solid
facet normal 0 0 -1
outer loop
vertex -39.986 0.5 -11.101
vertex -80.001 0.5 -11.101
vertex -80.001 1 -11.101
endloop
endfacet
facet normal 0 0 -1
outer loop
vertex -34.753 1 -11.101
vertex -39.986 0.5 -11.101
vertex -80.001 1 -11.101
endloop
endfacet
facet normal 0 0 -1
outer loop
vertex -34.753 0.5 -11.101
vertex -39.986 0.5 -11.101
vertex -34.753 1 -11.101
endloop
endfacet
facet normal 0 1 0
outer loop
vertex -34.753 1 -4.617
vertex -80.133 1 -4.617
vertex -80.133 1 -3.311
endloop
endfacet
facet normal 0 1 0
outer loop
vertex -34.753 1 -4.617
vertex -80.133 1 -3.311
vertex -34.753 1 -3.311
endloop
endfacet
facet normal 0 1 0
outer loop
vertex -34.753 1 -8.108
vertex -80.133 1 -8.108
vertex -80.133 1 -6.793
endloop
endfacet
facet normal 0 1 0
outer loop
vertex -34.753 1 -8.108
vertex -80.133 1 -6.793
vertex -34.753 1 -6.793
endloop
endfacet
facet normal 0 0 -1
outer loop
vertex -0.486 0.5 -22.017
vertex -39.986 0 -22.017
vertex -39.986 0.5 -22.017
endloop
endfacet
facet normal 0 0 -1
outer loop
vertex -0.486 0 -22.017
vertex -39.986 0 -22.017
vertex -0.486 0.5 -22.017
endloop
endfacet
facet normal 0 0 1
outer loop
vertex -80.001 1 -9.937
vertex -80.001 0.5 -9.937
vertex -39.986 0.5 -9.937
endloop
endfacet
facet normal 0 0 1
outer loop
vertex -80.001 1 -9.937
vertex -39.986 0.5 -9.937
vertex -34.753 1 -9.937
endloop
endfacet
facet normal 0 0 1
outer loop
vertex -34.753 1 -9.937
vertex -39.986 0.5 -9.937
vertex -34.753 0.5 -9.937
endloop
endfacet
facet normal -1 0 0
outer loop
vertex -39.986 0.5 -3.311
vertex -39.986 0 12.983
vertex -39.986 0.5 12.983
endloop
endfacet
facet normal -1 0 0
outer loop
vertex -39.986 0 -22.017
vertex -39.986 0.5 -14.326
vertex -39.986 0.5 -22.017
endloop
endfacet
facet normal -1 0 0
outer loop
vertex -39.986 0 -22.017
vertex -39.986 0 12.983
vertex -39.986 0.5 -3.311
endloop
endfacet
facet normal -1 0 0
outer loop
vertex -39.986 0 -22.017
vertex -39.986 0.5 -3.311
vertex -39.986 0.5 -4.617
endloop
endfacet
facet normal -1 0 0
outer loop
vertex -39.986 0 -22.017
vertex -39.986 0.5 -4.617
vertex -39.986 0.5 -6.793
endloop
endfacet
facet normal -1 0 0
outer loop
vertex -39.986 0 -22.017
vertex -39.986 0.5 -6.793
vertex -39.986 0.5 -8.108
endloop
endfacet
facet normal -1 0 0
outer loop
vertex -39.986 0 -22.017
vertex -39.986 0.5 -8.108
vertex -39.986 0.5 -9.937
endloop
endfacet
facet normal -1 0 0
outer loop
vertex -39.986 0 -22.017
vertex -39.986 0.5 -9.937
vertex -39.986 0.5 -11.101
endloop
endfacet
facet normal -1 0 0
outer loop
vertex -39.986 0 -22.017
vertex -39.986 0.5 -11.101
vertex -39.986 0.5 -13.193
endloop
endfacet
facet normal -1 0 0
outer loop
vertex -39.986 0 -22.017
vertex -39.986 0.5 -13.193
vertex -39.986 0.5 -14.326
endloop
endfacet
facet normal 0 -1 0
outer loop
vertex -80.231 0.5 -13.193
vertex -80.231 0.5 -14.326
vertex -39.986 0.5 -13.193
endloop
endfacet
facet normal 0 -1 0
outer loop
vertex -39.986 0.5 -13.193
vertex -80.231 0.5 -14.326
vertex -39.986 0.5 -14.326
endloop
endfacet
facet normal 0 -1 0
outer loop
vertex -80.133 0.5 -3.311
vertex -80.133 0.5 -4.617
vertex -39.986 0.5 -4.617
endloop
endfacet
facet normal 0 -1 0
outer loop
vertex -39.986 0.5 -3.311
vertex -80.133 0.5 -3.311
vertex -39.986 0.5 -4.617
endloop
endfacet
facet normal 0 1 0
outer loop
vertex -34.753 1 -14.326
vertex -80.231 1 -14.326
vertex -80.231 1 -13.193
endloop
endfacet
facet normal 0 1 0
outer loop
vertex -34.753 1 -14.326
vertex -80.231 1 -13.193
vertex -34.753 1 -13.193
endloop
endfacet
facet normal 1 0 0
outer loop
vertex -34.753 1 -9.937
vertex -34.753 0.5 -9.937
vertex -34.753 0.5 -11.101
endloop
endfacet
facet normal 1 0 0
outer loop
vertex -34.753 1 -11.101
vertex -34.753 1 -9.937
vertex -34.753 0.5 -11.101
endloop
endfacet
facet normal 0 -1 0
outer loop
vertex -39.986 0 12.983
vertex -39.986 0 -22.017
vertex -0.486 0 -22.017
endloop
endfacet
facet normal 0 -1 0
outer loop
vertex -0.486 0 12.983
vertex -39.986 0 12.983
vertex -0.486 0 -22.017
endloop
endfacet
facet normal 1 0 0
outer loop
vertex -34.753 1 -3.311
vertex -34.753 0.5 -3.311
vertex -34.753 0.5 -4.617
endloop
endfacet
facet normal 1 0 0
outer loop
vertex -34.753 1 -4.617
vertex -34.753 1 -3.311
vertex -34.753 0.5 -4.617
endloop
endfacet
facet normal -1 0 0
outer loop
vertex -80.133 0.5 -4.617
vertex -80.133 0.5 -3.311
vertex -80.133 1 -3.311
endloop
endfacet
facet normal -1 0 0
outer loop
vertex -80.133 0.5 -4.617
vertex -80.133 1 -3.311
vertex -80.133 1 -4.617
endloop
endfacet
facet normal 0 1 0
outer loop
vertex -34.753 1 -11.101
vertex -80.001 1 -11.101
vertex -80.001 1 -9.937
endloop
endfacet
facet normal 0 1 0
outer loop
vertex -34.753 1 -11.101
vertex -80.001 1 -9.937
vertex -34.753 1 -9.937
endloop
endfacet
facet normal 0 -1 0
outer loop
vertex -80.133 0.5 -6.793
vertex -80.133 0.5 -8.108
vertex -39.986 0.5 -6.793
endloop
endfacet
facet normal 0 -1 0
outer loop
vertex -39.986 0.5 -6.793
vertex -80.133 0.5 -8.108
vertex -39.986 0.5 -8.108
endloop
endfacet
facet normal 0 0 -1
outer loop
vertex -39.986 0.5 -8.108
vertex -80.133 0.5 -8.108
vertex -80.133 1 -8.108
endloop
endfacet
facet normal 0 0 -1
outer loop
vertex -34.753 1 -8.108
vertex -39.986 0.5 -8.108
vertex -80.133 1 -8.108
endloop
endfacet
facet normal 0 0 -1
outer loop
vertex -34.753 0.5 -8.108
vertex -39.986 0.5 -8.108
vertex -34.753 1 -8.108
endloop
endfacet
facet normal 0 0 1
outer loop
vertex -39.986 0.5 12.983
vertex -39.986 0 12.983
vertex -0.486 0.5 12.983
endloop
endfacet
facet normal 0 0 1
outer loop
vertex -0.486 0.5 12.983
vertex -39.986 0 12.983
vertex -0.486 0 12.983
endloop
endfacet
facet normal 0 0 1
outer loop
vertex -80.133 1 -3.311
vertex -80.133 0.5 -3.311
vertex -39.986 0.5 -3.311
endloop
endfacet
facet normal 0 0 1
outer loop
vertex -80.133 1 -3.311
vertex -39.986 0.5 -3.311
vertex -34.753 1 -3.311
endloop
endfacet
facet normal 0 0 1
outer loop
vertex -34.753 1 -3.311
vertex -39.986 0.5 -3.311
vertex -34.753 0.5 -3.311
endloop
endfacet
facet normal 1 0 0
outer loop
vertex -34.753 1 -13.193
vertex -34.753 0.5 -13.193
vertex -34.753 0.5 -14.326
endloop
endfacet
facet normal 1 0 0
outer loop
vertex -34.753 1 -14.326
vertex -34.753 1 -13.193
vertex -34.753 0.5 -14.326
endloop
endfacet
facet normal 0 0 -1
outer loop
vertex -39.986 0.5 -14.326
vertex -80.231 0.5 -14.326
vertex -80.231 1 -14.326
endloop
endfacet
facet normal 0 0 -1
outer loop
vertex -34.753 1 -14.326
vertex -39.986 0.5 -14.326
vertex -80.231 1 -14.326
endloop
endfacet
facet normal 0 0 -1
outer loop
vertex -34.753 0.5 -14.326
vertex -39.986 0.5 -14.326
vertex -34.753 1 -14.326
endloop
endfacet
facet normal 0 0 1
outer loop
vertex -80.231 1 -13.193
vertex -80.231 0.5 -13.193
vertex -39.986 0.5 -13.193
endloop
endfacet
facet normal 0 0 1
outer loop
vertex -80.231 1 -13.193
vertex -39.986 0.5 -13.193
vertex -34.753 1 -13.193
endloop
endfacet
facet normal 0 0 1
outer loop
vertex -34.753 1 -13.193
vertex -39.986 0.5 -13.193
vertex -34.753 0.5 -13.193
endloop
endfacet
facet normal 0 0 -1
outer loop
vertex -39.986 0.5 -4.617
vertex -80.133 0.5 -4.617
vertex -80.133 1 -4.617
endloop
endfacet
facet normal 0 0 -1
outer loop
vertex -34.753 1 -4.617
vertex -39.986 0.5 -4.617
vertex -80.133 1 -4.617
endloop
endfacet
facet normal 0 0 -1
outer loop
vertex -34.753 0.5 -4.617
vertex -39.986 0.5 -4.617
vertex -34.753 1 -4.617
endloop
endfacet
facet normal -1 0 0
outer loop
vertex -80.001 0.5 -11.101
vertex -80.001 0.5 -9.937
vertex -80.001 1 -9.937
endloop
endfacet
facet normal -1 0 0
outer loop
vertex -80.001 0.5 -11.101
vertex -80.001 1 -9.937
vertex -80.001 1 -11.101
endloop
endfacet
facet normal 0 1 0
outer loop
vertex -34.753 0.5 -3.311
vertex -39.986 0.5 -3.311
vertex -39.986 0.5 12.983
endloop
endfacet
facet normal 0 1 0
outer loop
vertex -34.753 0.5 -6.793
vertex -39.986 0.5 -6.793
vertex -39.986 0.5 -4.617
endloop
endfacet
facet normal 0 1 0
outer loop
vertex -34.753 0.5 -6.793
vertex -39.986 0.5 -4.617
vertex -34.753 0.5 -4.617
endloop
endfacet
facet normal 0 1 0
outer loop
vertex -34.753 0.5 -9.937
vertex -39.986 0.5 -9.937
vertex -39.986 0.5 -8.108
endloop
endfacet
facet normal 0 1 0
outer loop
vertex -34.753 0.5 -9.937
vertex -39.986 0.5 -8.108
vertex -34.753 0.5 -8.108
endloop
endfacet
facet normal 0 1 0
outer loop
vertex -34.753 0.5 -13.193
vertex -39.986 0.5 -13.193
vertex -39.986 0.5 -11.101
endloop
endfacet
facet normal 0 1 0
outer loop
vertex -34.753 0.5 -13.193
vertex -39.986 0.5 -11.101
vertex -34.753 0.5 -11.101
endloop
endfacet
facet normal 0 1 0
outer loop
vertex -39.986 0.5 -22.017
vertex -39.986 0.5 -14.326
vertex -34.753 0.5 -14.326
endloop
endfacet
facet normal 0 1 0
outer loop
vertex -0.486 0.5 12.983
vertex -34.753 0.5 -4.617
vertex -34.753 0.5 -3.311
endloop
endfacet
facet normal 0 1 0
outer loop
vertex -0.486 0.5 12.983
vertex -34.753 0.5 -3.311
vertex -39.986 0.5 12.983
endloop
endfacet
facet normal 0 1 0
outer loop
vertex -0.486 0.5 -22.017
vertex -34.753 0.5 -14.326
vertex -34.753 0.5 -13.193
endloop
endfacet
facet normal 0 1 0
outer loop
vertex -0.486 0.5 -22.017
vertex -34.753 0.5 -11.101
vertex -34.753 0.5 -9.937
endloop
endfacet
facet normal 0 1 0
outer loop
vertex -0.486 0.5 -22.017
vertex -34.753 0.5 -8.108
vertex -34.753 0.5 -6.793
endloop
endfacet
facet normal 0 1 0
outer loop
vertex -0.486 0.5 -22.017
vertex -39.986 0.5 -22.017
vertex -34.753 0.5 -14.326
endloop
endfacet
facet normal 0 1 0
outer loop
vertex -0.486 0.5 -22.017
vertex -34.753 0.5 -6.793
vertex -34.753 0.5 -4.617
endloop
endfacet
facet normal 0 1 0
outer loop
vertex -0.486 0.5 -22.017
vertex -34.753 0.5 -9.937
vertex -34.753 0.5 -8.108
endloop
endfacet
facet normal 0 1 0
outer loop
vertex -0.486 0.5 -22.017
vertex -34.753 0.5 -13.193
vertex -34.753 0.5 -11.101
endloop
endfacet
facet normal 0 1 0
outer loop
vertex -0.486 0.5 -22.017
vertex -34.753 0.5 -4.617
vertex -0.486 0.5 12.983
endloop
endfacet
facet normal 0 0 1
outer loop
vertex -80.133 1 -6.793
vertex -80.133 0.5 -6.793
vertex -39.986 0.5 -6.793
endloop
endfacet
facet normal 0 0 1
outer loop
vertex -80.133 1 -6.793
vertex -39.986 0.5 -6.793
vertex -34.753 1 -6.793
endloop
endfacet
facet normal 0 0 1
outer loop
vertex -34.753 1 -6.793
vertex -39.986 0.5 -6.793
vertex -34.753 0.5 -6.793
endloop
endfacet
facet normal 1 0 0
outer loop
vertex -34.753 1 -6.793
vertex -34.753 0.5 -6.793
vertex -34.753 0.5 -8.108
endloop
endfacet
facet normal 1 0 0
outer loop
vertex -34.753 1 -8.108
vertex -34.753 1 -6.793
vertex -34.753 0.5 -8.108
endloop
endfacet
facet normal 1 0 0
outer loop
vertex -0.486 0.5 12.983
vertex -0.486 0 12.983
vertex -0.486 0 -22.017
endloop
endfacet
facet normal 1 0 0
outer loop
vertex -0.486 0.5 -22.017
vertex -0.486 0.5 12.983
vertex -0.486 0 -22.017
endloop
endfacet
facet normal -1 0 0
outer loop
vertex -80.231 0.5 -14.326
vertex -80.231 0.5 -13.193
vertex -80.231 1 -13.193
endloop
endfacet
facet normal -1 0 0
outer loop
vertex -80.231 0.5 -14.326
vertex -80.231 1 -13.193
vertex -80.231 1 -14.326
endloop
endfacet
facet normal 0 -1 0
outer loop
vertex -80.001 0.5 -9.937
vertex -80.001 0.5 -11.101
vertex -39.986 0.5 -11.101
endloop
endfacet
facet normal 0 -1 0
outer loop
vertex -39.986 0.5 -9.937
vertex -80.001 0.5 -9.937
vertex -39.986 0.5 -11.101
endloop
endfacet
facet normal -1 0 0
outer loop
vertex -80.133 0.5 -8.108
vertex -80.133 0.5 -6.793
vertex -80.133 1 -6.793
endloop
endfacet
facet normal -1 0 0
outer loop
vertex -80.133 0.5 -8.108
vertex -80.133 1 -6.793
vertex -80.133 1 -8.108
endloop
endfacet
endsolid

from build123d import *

# Parameters (mm, degrees)
SKETCH1_W           = 39.5
SKETCH1_H           = 35
BOSS_EXTRUDE1_DEPTH = 0.5
SKETCH2_W           = 45.379526607
SKETCH2_H           = 1.305742029
SKETCH2_H_2         = 1.314948277
SKETCH2_W_2         = 45.247695687
SKETCH2_H_3         = 1.164010119
SKETCH2_W_3         = 45.478067193
SKETCH2_H_4         = 1.133268544
BOSS_EXTRUDE2_DEPTH = 0.5


with BuildPart() as part:
    # Sketch1 → Boss-Extrude1 (new body)
    with BuildSketch(Plane(origin=(0, 0, 0), x_dir=(1, 0, 0), z_dir=(0, 1, 0))):
        with Locations((-20.235966577, 4.516998197)):
            Rectangle(SKETCH1_W, SKETCH1_H)
    extrude(amount=BOSS_EXTRUDE1_DEPTH)

    # Sketch2 → Boss-Extrude2 (add)
    with BuildSketch(Plane(origin=(0, 0.5, 0), x_dir=(1, 0, 0), z_dir=(0, 1, 0))):
        with Locations((-57.442922572, 3.963636001)):
            Rectangle(SKETCH2_W, SKETCH2_H)
        with Locations((-57.442922572, 7.450727151)):
            Rectangle(SKETCH2_W, SKETCH2_H_2)
        with Locations((-57.377007112, 10.519214372)):
            Rectangle(SKETCH2_W_2, SKETCH2_H_3)
        with Locations((-57.492192865, 13.759786239)):
            Rectangle(SKETCH2_W_3, SKETCH2_H_4)
    extrude(amount=BOSS_EXTRUDE2_DEPTH)


solid = part.part
